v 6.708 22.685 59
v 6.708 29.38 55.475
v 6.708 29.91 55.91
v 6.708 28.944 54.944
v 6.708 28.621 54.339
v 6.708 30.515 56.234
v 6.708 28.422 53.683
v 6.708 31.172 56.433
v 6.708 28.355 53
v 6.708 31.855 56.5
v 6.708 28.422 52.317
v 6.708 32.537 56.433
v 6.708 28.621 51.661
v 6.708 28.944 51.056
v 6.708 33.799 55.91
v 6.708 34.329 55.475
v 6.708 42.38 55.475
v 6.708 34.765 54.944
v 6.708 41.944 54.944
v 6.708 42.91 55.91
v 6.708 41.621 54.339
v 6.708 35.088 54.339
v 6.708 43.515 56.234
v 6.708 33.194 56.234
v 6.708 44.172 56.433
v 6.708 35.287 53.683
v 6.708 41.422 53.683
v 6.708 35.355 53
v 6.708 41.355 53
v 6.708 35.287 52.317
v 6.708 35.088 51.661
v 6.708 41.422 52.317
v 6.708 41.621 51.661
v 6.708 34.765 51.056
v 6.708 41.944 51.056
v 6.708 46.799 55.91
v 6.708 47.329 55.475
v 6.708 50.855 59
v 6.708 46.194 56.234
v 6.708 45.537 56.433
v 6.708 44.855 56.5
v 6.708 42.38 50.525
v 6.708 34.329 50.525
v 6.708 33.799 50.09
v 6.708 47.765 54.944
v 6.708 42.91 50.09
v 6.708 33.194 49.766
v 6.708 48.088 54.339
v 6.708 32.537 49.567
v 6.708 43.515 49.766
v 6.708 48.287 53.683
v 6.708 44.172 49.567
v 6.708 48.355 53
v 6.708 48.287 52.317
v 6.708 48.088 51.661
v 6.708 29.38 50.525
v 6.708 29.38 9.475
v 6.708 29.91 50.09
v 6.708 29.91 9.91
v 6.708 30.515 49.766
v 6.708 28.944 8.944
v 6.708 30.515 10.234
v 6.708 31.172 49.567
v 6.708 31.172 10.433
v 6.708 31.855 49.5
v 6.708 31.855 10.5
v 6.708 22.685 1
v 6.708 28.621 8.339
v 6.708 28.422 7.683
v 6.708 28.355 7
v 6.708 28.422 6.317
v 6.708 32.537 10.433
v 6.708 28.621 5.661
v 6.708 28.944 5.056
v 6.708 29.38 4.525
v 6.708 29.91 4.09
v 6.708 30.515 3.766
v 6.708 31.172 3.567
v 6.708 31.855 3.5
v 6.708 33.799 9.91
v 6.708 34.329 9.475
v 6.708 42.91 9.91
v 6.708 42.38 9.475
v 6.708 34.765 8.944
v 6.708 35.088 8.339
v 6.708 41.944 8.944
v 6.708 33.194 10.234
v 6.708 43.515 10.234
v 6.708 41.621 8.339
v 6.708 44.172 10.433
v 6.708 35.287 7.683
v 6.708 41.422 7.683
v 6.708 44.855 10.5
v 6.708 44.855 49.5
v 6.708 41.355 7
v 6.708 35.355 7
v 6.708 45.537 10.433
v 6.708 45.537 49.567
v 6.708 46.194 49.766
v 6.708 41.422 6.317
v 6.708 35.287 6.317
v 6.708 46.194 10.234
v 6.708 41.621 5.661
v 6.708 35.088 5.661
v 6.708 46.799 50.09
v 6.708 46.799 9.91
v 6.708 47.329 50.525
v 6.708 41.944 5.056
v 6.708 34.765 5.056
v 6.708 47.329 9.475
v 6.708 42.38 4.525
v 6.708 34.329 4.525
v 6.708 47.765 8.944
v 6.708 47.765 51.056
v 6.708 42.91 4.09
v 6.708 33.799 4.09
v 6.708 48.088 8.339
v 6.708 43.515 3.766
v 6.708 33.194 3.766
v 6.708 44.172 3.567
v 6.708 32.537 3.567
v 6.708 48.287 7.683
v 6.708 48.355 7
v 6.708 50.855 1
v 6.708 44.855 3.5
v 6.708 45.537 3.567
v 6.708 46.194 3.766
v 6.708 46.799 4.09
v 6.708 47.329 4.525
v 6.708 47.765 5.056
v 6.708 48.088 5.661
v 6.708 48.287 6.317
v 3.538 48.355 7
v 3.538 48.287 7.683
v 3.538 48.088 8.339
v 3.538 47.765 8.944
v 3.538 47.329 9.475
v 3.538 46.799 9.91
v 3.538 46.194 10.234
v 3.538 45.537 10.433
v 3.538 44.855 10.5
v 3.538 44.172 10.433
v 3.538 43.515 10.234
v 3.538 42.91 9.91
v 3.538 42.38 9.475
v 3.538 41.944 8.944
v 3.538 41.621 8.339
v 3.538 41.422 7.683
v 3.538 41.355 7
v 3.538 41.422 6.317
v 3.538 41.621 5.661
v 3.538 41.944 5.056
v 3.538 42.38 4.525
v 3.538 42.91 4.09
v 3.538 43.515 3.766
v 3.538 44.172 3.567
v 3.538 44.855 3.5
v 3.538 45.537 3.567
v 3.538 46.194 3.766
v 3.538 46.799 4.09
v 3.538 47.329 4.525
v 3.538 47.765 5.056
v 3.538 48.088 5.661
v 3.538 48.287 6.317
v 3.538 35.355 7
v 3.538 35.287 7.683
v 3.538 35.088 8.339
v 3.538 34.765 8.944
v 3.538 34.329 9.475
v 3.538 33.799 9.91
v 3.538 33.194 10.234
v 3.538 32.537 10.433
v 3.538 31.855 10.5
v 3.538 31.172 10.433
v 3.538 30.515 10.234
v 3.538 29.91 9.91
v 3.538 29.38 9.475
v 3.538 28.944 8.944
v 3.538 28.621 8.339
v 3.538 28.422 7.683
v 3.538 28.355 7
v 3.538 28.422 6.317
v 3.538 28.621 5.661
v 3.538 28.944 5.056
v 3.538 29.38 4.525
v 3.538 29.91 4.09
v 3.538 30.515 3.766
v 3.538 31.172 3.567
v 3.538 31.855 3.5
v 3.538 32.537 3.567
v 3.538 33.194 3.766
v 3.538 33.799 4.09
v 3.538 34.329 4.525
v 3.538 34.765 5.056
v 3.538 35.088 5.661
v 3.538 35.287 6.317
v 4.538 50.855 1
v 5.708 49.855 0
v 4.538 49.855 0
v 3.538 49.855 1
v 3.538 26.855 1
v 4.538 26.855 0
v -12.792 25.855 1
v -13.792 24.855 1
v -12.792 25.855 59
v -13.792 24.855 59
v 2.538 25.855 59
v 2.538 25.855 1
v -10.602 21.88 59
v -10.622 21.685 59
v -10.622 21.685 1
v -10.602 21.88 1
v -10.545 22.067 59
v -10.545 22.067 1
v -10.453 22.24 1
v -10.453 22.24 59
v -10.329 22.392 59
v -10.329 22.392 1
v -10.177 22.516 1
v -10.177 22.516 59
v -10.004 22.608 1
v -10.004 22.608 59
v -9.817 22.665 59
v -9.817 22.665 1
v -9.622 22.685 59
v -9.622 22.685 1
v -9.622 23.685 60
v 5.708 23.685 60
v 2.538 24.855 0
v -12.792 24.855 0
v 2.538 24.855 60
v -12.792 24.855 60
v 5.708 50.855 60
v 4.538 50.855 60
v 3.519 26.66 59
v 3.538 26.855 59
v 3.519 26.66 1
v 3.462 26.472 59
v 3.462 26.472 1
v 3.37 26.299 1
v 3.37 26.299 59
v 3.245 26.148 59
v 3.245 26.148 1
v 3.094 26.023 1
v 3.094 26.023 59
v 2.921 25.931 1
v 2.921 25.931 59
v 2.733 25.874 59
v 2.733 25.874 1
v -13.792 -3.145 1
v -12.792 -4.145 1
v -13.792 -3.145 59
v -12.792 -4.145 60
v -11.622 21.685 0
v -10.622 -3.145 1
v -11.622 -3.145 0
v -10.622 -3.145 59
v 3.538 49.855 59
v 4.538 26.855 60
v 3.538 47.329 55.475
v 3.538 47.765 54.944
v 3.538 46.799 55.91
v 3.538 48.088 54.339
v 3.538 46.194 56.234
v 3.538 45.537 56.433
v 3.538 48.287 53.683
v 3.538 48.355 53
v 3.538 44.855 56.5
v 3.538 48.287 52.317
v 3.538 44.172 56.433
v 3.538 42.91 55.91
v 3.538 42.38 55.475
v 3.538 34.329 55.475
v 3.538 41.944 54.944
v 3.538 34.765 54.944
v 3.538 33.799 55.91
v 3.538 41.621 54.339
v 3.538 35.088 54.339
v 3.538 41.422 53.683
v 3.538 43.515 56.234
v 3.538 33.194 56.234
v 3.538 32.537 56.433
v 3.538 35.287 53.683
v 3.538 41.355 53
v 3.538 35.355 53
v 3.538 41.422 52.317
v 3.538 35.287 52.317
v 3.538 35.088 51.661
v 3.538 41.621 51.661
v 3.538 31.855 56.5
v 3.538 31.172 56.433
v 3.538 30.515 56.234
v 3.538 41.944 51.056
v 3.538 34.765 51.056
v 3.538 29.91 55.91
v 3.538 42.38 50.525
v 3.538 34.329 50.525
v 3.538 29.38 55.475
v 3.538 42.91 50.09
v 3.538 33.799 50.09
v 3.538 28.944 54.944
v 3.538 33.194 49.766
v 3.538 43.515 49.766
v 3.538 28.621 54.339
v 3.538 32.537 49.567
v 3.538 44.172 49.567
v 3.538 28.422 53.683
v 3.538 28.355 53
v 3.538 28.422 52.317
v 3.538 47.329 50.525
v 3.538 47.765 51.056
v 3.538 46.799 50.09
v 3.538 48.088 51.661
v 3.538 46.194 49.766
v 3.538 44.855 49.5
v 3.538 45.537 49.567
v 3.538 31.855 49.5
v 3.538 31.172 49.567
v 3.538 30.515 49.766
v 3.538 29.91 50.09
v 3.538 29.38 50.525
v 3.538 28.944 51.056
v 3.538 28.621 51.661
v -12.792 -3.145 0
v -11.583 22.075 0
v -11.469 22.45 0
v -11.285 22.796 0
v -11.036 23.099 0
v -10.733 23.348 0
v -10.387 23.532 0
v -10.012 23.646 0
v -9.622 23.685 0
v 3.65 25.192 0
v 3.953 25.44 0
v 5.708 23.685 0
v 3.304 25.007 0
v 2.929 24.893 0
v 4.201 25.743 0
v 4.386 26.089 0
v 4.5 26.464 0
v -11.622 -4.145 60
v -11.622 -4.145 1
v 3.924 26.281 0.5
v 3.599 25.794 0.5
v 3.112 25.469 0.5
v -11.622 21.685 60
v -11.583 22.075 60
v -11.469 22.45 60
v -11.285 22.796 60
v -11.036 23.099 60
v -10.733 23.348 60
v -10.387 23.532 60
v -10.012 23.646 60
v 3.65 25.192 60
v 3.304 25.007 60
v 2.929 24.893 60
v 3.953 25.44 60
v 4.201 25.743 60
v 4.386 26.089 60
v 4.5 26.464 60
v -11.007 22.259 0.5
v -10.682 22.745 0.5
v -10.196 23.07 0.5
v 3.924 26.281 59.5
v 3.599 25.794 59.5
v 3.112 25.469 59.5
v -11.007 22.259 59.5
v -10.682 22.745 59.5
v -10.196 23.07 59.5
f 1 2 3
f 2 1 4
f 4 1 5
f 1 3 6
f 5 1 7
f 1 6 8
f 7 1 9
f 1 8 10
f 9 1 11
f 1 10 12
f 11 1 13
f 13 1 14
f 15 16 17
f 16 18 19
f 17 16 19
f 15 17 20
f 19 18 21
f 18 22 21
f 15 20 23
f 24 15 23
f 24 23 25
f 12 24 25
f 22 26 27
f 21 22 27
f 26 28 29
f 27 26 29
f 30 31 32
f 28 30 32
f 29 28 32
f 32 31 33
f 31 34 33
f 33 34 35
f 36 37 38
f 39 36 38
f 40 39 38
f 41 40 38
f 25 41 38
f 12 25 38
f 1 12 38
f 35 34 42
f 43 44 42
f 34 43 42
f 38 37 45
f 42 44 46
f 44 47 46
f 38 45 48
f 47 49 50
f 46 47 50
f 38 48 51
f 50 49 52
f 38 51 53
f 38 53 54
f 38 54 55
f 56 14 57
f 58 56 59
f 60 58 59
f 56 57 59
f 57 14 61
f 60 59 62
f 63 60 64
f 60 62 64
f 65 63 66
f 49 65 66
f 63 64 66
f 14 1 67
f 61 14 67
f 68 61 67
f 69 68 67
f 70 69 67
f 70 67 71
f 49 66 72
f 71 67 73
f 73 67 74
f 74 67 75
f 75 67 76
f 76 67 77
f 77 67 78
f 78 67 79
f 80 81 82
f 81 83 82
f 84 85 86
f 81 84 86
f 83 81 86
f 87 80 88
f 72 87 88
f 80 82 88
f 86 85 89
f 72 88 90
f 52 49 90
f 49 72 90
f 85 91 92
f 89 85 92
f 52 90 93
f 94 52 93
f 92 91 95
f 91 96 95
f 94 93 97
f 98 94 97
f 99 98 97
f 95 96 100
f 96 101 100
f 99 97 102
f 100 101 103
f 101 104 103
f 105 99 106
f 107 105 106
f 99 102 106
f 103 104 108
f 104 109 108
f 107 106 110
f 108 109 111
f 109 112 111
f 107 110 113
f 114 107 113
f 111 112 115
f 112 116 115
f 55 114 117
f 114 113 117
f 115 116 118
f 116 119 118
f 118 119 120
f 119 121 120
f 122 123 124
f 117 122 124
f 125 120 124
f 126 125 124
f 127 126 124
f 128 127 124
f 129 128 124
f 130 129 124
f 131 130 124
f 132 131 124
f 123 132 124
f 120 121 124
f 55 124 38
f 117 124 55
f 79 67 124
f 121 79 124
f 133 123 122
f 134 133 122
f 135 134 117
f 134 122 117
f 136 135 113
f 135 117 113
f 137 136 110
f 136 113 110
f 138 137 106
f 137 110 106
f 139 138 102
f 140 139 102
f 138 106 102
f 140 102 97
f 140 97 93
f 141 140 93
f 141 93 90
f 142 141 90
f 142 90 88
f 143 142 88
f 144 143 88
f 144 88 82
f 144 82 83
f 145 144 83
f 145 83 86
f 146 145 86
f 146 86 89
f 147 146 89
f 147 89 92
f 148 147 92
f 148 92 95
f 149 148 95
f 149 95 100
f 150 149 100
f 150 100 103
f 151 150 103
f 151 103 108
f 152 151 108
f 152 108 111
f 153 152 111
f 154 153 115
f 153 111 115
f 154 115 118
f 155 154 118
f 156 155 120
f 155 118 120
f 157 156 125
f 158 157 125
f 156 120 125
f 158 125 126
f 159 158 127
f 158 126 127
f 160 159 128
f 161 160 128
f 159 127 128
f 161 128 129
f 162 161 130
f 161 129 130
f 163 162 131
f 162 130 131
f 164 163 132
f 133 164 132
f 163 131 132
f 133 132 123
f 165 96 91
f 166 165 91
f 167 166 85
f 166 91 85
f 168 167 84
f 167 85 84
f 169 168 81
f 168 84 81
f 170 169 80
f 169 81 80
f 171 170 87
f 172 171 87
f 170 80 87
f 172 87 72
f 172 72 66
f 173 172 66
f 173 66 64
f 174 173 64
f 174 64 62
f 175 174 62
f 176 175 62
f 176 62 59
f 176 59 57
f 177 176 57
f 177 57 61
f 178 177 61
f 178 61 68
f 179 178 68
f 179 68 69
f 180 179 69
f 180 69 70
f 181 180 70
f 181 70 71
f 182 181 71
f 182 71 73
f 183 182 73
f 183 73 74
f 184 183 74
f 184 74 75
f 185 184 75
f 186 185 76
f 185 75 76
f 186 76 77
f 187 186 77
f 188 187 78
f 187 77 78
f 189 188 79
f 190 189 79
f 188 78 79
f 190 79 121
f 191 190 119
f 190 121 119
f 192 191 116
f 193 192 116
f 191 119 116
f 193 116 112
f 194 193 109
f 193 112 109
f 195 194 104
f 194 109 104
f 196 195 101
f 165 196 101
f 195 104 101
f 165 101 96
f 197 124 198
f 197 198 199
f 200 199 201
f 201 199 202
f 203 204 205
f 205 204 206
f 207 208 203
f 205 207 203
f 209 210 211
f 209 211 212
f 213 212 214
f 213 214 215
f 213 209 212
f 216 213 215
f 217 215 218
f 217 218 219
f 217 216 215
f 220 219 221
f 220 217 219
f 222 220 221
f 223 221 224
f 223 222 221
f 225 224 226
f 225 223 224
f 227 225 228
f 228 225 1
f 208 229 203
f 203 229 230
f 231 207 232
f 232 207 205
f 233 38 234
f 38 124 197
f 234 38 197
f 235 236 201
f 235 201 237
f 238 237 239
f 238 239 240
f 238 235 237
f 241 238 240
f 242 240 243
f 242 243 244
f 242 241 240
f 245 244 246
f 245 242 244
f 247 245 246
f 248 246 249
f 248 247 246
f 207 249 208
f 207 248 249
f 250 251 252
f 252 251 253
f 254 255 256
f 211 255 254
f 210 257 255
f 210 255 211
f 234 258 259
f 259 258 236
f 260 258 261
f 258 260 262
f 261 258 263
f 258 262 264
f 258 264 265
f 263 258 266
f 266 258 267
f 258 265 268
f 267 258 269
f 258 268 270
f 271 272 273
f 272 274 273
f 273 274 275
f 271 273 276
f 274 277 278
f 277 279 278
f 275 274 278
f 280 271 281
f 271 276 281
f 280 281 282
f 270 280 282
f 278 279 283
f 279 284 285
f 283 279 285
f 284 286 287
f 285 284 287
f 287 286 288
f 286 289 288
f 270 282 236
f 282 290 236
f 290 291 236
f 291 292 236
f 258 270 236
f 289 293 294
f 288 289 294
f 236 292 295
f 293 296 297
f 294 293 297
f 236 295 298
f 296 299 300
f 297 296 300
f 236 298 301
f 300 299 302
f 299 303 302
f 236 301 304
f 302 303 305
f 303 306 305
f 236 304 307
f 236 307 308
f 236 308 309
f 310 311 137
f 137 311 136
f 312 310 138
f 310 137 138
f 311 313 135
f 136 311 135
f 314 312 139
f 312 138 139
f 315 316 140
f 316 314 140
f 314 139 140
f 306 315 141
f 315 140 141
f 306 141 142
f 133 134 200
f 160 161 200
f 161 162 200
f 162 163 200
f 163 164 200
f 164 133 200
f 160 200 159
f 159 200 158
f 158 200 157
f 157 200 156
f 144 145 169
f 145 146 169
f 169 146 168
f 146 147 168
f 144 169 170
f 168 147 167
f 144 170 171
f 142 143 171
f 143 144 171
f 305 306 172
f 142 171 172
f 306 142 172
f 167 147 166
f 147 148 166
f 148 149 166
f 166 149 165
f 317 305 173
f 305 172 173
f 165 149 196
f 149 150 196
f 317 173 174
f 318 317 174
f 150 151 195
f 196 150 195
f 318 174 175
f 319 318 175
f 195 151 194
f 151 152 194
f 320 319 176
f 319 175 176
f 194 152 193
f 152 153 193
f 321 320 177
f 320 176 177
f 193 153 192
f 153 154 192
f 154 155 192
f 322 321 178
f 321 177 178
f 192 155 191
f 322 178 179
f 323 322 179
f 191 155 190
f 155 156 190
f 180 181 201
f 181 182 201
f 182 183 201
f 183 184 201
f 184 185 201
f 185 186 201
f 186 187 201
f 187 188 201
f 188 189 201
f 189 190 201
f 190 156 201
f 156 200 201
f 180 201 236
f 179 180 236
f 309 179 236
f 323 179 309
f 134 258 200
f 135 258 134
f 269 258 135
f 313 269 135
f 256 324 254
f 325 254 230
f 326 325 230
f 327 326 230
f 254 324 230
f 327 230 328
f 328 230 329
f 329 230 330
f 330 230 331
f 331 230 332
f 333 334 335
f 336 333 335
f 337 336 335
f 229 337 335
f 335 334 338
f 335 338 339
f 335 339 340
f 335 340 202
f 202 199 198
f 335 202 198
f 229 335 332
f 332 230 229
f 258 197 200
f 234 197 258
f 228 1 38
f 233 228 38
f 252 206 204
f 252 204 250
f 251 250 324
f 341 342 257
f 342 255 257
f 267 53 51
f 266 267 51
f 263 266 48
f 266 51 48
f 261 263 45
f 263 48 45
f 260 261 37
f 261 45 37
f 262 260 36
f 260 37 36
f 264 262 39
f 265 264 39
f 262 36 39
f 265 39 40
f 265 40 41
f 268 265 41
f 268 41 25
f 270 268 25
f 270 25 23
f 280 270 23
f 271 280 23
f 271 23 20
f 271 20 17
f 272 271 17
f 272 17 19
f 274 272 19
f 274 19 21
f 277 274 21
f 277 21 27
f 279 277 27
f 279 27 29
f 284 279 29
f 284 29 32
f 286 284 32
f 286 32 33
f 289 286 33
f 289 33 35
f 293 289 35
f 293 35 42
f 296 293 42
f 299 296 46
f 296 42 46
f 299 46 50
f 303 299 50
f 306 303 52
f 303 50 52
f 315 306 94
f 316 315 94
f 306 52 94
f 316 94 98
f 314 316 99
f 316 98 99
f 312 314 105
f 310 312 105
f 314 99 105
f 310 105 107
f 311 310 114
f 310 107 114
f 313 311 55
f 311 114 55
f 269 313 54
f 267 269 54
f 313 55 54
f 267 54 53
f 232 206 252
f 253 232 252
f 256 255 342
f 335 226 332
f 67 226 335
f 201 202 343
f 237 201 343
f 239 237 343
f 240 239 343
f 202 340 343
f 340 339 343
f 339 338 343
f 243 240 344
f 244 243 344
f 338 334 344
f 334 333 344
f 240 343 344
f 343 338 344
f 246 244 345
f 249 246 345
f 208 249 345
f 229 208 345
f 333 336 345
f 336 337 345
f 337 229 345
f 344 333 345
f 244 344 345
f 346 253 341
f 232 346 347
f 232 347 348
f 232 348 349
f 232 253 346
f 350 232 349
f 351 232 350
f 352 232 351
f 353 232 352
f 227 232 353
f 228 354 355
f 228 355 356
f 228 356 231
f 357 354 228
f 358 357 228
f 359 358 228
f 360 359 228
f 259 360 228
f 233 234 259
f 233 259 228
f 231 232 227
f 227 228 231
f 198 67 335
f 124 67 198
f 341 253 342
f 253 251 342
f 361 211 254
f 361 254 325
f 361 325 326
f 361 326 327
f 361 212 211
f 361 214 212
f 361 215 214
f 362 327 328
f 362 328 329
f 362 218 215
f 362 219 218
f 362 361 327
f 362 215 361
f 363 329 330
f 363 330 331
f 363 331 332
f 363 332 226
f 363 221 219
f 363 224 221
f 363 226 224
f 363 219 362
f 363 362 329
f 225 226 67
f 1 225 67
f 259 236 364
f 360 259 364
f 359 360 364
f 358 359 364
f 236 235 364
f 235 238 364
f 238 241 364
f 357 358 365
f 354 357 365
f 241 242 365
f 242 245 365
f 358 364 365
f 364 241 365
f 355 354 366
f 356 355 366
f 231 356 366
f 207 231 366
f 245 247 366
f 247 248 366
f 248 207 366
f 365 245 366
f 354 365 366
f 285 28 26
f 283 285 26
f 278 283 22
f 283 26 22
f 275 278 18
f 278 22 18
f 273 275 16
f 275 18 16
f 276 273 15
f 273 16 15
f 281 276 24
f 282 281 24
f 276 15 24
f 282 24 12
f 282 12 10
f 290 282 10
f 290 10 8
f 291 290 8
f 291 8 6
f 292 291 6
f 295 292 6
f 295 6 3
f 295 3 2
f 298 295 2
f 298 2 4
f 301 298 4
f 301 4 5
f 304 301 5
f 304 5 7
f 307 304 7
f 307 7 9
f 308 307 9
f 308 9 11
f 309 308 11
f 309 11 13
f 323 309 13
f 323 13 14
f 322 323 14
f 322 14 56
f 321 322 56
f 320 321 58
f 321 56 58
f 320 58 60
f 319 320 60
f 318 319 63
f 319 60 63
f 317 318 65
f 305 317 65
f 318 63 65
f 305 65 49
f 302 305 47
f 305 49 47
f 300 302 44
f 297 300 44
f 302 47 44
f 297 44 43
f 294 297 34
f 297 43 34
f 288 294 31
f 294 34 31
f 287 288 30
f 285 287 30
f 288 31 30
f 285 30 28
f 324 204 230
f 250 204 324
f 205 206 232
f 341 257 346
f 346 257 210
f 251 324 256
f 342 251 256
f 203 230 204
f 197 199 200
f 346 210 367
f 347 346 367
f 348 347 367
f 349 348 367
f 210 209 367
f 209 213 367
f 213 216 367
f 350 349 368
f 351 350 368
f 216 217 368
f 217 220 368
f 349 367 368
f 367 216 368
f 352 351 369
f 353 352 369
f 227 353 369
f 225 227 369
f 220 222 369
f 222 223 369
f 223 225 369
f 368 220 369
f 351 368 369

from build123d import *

# Parameters (mm, degrees)
SALIENTE_EXTRUIR1_DEPTH = 60
CROQUIS2_R              = 3.5
CORTAR_EXTRUIR1_DEPTH   = 60
REDONDEO1_R             = 1
CHAFL_N1_SIZE           = 1


with BuildPart() as part:
    # Croquis1 → Saliente-Extruir1 (new body)
    with BuildSketch(Plane.XY):
        Polygon((3.538389259, 50.854615385), (3.538389259, 25.854615385), (-13.791610741, 25.854615385), (-13.791610741, -4.145384615), (-10.621610741, -4.145384615), (-10.621610741, 22.684615385), (6.708389259, 22.684615385), (6.708389259, 50.854615385), align=None)
    extrude(amount=SALIENTE_EXTRUIR1_DEPTH)

    # Croquis2 → Cortar-Extruir1 (cut)
    with BuildSketch(Plane(origin=(6.708389259, 0, 0), x_dir=(0, 0, -1), z_dir=(1, 0, 0))):
        with Locations(Location((-53, 44.854615385, 0), (0, 0, 90))):
            Circle(CROQUIS2_R)
        with Locations(Location((-53, 31.854615385, 0), (0, 0, 90))):
            Circle(CROQUIS2_R)
        with Locations(Location((-7, 44.854615385, 0), (0, 0, 90))):
            Circle(CROQUIS2_R)
        with Locations(Location((-7, 31.854615385, 0), (0, 0, 90))):
            Circle(CROQUIS2_R)
    extrude(amount=-CORTAR_EXTRUIR1_DEPTH, mode=Mode.SUBTRACT)

    # Redondeo1
    redondeo1_edges = [part.edges().sort_by_distance(p)[0] for p in [
        (-10.621610741, 22.684615385, 30),
        (3.538389259, 25.854615385, 30),
    ]]
    fillet(redondeo1_edges, radius=REDONDEO1_R)

    # Chaflán1
    chafl_n1_edges = [part.edges().sort_by_distance(p)[0] for p in [
        (-13.791610741, 10.854615385, 0),
        (3.538389259, 38.854615385, 0),
        (5.123389259, 50.854615385, 0),
        (-10.621610741, -4.145384615, 30),
        (-13.791610741, -4.145384615, 30),
        (-13.791610741, 25.854615385, 30),
        (3.538389259, 50.854615385, 30),
        (-13.791610741, 10.854615385, 60),
        (-10.621610741, 8.769615385, 60),
        (6.708389259, 36.769615385, 60),
        (-1.456610741, 22.684615385, 0),
        (-1.456610741, 22.684615385, 60),
        (-5.626610741, 25.854615385, 0),
        (-5.626610741, 25.854615385, 60),
        (-10.328717522, 22.391722166, 0),
        (-10.328717522, 22.391722166, 60),
        (3.24549604, 26.147508603, 0),
        (3.24549604, 26.147508603, 60),
        (6.708389259, 36.769615385, 0),
        (3.538389259, 38.854615385, 60),
        (-10.621610741, 8.769615385, 0),
        (-12.206610741, -4.145384615, 0),
    ]]
    chamfer(chafl_n1_edges, length=CHAFL_N1_SIZE)


solid = part.part
